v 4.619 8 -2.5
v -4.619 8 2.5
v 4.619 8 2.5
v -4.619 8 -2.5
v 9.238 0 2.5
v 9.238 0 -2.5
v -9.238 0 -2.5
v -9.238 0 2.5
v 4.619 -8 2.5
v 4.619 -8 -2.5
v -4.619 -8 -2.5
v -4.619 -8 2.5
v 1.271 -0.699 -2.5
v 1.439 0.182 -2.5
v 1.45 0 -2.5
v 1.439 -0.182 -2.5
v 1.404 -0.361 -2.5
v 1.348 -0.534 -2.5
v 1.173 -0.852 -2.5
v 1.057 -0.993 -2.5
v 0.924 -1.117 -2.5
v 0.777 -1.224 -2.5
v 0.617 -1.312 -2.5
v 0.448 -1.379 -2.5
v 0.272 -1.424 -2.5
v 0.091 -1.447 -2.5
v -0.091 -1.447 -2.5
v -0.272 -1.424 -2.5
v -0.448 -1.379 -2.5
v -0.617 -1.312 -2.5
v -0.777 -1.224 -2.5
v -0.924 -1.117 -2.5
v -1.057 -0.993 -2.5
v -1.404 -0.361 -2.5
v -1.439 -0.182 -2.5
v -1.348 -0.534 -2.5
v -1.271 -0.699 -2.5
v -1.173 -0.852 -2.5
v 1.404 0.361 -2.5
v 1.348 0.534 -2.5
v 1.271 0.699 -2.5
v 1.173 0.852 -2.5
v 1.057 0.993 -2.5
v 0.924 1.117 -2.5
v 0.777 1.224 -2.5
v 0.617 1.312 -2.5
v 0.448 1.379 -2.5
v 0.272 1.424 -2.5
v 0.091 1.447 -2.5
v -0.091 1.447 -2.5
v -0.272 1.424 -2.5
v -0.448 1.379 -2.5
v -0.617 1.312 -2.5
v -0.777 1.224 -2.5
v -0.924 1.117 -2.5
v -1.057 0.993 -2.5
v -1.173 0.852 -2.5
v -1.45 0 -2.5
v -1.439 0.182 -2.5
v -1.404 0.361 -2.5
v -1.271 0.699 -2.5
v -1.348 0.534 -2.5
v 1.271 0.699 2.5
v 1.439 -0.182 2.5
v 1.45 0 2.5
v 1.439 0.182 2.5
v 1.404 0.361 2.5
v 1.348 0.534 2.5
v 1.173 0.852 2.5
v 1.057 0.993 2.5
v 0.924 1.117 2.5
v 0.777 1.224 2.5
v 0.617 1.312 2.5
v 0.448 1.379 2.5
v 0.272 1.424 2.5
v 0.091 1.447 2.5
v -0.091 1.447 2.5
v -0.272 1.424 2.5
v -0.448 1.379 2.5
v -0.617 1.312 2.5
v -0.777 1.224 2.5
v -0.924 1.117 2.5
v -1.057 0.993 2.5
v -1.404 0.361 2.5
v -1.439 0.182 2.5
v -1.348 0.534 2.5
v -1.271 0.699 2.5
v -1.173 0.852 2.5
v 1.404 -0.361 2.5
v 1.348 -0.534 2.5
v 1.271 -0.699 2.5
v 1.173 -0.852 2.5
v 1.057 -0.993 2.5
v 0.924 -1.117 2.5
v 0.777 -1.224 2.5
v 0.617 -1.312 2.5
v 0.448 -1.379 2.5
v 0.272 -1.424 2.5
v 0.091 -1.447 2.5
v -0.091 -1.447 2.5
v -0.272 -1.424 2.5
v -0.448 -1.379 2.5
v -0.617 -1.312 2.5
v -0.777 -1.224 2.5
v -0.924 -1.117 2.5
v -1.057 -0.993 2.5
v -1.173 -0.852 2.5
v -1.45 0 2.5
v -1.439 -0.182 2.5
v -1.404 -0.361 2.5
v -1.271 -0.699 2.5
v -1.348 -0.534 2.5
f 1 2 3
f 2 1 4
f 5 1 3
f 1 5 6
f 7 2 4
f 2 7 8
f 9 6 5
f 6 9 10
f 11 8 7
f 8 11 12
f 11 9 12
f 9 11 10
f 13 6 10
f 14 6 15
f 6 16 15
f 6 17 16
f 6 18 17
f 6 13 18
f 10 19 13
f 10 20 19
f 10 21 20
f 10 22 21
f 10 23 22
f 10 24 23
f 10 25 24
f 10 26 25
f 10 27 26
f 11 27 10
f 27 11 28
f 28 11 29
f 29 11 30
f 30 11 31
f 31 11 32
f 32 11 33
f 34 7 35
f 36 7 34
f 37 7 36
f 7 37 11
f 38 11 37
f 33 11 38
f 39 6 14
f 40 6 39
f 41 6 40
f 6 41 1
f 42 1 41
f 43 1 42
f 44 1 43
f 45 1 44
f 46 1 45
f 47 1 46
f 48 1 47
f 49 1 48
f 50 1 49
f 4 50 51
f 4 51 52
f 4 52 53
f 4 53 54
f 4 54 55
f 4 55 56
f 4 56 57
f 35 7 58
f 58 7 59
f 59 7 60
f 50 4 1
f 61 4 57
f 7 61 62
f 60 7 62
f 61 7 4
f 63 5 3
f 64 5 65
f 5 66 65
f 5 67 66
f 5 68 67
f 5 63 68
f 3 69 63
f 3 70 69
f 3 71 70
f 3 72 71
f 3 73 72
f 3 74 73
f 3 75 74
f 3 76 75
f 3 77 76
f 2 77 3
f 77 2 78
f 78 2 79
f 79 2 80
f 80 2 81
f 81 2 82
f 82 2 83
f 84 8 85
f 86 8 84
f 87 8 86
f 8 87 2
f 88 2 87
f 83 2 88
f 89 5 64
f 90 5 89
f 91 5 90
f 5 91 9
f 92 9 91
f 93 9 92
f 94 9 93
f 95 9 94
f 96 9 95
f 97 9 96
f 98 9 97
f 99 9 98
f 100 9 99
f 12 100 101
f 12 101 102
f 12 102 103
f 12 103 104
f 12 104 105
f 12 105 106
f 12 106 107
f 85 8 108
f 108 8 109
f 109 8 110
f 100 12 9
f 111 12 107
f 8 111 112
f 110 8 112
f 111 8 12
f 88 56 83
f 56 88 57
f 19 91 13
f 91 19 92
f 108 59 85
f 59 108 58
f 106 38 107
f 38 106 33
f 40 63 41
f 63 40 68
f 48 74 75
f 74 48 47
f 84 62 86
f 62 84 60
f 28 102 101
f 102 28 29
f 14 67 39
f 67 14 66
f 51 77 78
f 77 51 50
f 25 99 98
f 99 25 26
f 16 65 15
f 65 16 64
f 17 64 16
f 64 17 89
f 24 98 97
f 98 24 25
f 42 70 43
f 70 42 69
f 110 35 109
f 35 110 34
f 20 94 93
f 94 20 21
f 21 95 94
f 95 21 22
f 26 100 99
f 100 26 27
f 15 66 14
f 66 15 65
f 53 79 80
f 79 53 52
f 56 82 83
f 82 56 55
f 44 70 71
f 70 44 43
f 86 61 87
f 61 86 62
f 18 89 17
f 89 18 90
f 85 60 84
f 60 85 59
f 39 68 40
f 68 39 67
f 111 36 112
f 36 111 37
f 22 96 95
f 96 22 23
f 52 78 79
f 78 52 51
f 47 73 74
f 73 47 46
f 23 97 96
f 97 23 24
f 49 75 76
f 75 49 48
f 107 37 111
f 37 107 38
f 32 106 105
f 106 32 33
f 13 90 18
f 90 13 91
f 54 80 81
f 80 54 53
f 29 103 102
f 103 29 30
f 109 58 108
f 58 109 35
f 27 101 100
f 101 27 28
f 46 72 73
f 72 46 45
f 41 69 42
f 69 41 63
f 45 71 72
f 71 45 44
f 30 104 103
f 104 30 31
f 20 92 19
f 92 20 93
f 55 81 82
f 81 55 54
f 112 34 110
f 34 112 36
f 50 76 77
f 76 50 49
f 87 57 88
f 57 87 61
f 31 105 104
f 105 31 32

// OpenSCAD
nut(8,5,2.9);

//w = Distance from center to flat edge
//height = thickness of nut
//hole = diameter of center hole cutout
module nut(w, height, hole){
    t6=tan(60);
    
    difference(){
        linear_extrude(height, center=true)
            polygon([[w/t6,w],[-w/t6,w],[-(((w/t6)^2+w^2)^0.5),0],[-w/t6,-w],[w/t6,-w],[(((w/t6)^2+w^2)^0.5),0]]);

        cylinder(d=hole, h=height+1, center=true, $fn=50);
    }
}
